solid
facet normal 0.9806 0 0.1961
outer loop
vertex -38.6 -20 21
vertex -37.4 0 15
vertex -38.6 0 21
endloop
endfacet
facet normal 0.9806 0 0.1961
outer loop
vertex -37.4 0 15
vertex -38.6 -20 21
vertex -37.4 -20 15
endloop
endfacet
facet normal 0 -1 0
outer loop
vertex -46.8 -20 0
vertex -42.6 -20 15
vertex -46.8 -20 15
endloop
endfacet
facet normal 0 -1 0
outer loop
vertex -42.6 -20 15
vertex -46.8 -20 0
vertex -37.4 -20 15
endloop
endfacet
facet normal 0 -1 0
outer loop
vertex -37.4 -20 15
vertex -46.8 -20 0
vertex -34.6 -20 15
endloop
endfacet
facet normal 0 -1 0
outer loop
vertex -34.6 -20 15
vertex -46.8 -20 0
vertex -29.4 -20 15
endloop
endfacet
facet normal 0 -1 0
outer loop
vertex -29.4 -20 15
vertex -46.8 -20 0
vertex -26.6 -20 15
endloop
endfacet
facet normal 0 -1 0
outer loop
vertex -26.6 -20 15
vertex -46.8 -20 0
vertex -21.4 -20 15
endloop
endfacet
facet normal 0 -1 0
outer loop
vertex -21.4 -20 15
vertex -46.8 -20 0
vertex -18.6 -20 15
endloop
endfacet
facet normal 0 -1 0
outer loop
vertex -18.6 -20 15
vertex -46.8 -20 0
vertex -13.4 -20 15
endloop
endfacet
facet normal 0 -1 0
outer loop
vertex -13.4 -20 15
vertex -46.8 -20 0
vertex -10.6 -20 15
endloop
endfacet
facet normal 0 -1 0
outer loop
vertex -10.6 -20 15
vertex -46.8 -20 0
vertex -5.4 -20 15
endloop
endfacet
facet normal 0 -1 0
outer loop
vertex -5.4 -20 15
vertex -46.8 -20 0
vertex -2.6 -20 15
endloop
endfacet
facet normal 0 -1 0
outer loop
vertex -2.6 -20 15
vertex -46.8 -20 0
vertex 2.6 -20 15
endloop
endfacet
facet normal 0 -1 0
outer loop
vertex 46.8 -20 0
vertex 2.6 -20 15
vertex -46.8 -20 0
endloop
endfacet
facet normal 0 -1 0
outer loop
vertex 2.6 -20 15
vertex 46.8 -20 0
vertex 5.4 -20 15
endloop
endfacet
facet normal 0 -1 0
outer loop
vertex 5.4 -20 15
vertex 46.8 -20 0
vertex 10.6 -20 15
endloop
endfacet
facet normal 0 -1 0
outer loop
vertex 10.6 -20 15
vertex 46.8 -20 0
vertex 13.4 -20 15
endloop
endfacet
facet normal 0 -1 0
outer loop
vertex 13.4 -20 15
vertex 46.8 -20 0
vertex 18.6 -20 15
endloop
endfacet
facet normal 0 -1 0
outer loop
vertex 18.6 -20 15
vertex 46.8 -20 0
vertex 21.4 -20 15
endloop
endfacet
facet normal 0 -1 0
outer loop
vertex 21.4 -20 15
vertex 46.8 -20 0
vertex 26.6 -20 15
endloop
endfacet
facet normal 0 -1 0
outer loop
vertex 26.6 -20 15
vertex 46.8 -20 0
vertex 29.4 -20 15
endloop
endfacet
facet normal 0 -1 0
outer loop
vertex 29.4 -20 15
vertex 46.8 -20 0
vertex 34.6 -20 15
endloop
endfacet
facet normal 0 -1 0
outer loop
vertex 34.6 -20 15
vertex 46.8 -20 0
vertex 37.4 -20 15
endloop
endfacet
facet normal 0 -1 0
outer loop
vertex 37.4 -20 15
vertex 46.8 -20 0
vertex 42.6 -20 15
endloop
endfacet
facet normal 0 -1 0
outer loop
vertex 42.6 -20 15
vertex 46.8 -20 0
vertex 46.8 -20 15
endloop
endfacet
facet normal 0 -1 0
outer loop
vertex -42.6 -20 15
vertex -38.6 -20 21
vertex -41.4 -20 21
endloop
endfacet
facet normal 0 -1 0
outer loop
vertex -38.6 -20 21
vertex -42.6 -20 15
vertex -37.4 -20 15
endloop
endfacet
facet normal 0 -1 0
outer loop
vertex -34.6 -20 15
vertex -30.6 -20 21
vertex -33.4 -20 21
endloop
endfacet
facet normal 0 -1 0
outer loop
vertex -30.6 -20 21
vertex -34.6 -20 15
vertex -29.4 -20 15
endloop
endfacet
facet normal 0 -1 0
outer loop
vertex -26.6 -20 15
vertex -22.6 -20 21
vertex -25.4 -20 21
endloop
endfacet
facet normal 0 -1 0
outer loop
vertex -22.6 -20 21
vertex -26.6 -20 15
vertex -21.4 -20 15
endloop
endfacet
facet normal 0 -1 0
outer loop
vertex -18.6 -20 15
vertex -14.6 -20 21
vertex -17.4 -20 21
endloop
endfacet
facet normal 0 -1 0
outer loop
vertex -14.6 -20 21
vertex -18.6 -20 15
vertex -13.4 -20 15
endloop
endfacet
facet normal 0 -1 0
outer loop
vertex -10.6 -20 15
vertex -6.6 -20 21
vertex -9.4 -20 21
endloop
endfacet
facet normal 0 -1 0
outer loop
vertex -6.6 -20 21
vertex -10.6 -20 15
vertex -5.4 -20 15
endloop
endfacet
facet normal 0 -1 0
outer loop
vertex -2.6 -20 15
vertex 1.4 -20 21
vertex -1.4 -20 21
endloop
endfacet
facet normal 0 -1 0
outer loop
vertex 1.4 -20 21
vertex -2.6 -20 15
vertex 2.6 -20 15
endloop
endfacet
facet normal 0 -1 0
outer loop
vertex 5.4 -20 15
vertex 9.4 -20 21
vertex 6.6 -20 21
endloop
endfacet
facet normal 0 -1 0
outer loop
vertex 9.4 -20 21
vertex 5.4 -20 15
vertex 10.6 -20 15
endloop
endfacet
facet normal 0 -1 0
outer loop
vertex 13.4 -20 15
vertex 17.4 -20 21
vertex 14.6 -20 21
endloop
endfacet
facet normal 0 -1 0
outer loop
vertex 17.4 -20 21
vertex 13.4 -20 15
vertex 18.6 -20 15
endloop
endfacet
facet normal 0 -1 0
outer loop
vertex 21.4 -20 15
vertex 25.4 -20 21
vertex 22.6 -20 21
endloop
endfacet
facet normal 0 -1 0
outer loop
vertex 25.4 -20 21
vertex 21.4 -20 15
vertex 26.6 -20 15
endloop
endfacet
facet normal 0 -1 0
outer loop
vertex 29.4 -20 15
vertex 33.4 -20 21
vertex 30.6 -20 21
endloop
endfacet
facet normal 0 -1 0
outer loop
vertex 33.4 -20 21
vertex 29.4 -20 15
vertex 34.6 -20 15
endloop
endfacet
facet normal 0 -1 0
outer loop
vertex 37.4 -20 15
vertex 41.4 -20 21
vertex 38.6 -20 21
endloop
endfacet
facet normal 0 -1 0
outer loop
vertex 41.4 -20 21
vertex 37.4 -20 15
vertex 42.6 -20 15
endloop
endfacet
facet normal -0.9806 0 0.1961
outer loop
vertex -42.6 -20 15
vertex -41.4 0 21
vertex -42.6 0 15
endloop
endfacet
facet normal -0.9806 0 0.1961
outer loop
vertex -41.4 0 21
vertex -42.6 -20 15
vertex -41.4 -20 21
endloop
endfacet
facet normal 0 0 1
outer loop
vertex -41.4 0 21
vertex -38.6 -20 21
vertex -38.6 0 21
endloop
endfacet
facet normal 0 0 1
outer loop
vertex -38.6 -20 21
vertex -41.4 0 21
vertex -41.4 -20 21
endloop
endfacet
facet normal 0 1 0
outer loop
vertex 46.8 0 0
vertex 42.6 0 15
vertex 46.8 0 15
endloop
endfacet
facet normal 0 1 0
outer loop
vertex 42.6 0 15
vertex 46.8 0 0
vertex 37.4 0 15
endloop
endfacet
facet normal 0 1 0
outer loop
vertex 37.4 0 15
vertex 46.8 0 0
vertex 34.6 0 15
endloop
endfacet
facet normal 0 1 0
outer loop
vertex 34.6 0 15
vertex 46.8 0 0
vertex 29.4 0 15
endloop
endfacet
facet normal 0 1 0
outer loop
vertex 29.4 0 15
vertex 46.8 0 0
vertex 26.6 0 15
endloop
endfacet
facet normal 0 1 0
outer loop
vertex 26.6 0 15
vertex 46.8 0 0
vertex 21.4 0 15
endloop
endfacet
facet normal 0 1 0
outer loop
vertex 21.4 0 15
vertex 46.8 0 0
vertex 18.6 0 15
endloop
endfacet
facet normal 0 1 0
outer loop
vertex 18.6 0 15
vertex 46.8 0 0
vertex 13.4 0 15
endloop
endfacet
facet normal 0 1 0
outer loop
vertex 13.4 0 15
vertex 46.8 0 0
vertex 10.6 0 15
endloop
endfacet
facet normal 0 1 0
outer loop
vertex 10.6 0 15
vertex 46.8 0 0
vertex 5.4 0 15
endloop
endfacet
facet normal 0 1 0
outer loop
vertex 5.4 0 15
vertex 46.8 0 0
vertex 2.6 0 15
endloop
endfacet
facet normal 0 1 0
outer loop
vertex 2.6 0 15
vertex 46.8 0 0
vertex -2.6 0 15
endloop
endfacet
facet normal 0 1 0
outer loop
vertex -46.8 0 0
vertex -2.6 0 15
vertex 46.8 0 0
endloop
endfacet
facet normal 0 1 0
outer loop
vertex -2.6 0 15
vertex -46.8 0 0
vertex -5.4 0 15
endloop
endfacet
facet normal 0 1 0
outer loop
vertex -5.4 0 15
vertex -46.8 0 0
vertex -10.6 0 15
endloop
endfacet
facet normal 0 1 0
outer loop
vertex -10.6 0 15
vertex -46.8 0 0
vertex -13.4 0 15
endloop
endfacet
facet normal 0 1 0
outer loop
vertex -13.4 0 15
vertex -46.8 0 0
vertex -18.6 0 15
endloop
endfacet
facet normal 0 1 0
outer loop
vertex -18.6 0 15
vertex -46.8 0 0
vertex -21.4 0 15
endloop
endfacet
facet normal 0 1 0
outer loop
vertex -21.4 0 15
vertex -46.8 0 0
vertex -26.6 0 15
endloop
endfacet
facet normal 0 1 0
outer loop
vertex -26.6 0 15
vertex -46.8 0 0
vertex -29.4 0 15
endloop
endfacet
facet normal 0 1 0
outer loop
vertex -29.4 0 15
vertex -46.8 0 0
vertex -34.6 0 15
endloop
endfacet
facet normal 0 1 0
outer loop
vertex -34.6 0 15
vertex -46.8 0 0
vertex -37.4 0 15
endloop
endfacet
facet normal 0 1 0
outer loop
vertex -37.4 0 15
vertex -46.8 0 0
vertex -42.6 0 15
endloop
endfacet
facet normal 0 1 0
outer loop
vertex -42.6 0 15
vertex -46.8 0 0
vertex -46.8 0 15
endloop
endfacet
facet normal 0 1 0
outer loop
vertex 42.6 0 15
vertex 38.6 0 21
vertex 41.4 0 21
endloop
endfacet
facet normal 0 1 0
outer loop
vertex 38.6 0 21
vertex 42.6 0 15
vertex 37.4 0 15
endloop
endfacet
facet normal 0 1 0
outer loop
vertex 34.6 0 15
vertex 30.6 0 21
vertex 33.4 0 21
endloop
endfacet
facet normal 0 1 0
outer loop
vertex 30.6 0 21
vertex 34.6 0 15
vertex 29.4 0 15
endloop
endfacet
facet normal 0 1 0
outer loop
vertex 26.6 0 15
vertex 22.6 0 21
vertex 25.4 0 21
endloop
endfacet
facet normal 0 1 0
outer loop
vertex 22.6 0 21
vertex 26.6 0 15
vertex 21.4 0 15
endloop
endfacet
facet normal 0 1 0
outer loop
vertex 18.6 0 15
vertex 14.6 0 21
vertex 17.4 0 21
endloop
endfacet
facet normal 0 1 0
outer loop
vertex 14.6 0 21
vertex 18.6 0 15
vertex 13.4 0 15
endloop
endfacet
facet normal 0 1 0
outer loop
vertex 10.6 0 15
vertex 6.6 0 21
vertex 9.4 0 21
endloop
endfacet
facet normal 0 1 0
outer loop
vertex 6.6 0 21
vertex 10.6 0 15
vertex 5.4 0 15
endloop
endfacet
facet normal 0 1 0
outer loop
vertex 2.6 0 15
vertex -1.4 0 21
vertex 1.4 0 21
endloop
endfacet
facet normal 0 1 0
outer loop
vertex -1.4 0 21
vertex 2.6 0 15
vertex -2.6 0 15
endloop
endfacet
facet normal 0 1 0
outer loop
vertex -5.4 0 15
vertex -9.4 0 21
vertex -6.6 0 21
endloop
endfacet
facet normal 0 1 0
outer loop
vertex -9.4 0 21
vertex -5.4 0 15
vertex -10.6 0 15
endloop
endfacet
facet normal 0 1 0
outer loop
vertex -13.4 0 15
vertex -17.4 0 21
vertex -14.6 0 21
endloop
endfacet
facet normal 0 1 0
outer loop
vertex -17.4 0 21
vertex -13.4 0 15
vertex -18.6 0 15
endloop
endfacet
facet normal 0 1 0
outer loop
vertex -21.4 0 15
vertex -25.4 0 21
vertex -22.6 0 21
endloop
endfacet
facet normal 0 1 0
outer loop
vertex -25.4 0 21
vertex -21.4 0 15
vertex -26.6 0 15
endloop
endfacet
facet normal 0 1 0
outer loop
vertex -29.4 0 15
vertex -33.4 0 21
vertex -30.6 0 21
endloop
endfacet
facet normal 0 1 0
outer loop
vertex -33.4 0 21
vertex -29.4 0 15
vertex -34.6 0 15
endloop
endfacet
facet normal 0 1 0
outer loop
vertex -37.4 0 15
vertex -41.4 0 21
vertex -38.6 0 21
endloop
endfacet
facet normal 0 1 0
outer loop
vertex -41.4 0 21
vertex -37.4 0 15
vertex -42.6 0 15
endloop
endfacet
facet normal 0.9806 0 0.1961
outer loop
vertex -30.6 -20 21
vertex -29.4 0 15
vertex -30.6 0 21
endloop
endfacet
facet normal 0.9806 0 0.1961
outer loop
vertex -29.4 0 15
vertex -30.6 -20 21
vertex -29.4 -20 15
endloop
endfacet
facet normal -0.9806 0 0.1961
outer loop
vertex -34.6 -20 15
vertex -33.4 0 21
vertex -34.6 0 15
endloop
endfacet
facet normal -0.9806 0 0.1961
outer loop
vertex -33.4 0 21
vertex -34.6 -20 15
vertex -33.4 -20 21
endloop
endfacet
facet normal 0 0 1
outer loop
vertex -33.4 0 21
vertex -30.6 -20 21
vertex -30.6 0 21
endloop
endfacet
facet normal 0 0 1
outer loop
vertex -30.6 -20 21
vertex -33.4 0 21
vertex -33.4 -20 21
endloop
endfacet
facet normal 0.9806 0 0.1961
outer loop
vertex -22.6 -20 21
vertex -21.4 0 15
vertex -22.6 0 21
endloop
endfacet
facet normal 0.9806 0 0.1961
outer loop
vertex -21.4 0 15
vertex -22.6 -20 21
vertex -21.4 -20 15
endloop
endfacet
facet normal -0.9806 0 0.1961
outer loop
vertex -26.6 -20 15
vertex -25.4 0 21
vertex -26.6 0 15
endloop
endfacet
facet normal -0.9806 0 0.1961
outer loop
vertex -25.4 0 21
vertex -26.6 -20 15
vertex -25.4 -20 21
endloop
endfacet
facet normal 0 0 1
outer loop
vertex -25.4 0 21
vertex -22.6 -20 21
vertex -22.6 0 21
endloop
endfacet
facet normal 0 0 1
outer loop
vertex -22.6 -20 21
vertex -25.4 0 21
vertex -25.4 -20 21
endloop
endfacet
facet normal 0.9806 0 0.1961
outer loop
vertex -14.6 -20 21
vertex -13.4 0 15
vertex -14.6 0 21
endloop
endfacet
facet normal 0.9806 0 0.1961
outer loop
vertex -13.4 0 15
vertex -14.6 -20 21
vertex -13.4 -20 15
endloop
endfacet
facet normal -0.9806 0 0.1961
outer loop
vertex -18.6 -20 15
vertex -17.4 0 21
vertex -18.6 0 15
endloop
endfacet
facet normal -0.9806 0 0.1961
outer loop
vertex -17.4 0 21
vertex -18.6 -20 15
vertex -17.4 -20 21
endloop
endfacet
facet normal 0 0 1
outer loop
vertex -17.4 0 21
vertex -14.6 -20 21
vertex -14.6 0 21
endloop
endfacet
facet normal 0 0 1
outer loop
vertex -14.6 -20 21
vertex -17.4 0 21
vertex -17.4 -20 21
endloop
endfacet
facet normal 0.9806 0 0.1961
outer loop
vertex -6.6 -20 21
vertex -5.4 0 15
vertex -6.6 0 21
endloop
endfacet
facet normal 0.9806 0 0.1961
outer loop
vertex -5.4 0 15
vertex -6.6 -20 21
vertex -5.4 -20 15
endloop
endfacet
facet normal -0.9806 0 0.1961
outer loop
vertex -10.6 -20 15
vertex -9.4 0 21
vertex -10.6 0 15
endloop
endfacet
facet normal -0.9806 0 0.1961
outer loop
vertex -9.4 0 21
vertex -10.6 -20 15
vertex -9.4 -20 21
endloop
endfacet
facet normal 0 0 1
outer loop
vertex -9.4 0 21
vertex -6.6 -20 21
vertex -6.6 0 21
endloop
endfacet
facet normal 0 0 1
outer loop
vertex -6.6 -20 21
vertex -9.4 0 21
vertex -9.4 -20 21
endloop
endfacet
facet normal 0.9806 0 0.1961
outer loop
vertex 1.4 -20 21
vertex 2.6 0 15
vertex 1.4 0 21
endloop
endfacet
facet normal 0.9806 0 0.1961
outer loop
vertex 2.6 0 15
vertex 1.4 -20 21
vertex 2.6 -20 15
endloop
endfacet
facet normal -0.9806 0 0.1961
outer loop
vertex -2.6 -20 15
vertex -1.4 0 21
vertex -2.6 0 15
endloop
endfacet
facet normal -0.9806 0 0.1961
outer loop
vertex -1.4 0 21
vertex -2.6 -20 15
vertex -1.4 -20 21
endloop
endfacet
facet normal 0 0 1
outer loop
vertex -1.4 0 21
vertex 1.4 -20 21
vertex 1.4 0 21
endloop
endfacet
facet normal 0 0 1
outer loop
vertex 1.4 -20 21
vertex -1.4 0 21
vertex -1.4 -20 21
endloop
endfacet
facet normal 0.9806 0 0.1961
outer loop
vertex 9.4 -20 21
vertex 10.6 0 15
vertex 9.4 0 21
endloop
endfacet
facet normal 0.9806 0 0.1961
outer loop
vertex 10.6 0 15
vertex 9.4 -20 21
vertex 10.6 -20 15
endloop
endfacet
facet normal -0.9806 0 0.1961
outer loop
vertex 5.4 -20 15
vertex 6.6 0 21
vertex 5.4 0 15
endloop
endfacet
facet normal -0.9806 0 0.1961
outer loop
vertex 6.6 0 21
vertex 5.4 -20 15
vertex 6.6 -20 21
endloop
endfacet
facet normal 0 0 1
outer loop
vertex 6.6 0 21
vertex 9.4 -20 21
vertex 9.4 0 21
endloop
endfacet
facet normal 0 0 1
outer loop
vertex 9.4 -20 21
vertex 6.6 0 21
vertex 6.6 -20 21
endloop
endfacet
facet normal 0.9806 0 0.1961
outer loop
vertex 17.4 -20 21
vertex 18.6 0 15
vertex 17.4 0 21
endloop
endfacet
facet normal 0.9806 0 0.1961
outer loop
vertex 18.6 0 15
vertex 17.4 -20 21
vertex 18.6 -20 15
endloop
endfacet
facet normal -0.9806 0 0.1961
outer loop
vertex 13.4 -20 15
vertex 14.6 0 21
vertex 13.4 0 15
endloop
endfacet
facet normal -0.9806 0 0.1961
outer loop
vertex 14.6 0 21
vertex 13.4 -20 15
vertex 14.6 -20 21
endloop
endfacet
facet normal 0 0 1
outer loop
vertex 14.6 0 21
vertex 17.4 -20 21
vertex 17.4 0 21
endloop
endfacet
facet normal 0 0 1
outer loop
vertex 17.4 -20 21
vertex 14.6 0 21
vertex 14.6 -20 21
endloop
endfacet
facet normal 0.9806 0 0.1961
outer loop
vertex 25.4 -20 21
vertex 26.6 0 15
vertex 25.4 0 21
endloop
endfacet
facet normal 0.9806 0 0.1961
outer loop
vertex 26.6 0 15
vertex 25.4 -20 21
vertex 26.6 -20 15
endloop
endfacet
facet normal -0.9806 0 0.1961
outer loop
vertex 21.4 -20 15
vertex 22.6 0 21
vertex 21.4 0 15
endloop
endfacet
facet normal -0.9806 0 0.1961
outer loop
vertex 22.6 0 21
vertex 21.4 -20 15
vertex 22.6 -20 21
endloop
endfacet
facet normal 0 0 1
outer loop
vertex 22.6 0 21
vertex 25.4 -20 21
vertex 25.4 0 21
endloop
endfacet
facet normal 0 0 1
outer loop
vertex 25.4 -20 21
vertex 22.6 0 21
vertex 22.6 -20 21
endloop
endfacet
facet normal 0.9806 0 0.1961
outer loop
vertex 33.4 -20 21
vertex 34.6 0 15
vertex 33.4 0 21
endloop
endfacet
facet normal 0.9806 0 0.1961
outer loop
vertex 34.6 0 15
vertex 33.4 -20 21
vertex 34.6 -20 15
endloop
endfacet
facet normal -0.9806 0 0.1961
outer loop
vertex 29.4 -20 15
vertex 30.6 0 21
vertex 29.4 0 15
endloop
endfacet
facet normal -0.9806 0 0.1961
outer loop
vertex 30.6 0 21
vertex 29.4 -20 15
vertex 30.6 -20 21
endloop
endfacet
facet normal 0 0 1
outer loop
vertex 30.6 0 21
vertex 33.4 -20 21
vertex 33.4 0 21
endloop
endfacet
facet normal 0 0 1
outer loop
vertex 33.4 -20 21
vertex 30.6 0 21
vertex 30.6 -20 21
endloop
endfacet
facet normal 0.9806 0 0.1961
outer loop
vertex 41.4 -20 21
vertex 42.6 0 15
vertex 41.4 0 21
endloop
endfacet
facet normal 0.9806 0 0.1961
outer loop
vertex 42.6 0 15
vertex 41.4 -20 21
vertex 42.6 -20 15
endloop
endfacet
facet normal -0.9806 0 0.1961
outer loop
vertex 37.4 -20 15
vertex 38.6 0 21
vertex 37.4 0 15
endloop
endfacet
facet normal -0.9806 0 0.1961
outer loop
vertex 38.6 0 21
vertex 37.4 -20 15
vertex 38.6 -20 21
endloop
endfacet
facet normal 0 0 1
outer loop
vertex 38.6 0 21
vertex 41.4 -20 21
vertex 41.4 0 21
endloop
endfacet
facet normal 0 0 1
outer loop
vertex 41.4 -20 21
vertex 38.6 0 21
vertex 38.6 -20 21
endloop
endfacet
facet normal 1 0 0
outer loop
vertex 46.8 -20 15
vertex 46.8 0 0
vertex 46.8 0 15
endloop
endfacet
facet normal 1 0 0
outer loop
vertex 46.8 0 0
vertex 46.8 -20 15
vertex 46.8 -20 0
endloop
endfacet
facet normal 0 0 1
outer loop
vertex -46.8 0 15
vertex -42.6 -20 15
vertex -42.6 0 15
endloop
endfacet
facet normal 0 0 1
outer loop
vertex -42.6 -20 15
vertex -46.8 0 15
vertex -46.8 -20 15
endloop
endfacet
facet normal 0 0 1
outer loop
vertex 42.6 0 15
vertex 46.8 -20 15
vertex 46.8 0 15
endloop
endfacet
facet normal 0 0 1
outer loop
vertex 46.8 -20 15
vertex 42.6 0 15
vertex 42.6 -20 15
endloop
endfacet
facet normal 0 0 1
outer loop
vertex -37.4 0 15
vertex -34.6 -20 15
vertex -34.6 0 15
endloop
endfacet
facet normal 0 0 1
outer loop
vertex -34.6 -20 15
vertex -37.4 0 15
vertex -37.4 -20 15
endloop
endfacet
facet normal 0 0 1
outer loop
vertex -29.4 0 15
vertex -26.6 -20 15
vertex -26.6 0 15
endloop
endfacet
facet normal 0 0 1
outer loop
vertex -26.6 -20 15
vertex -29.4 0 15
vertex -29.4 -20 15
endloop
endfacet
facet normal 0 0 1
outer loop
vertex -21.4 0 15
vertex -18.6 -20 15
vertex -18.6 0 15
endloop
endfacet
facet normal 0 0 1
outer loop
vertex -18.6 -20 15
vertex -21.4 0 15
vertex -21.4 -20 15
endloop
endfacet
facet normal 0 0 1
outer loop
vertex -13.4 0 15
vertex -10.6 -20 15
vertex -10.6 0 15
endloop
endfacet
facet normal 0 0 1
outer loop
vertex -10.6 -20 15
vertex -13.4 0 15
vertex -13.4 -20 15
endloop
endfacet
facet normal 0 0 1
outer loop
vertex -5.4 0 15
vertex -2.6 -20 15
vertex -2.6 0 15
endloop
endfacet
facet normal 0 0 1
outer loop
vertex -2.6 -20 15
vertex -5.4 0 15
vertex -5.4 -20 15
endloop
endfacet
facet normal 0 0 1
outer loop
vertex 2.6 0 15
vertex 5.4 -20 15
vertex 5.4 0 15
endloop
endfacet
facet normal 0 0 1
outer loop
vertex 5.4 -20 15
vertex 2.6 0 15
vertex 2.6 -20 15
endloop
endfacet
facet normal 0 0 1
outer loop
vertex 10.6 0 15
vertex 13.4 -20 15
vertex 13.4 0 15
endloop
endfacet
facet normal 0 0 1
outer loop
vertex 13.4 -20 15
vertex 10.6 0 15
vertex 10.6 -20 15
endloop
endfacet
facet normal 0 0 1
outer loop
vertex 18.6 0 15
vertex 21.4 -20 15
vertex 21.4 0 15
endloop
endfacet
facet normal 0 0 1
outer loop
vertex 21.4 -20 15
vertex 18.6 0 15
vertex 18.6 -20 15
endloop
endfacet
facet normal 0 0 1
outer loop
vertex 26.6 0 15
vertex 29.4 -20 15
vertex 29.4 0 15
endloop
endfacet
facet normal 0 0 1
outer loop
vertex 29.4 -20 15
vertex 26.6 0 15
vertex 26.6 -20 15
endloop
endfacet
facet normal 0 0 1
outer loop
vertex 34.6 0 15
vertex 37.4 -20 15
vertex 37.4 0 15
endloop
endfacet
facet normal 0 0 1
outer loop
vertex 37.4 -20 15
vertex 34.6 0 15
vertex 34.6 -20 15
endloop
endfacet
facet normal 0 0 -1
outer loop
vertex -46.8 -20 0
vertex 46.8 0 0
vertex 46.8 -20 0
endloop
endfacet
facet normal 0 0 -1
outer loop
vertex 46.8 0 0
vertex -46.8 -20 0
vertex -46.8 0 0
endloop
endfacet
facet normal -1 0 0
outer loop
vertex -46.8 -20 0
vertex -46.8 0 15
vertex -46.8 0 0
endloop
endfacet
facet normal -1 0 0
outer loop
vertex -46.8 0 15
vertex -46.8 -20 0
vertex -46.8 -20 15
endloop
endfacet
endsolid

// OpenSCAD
$fn = 32;

// ----------------------------------------------------------------------
// Toothed rack, 11 teeth
// 8 mm pitch, 6 mm teeth
// ----------------------------------------------------------------------

// --- parameters (mm) ---
bar_w = 20;     // bar width (Y)
bar_h = 15;     // bar height (Z)
teeth = 11;     // number of teeth
pitch = 8;      // tooth pitch
tooth_h = 6;    // tooth height above the bar
root_w = 5.6;   // tooth width at the root
crest_w = 2.8;  // tooth width at the crest

// --- derived feature positions (mm) ---
span = (teeth - 1) * pitch;  // = 80   distance between the outer teeth
bar_l = span + root_w + 8;   // = 93.6   bar length: teeth plus 4 mm at each end
tooth_x = -span / 2;         // = -40   X of the first tooth
height = bar_h + tooth_h;    // = 21   overall height
feature_centers = [
  [tooth_x + 0 * pitch, -bar_w / 2],
  [tooth_x + 1 * pitch, -bar_w / 2],
  [tooth_x + 2 * pitch, -bar_w / 2],
  [tooth_x + 3 * pitch, -bar_w / 2],
  [tooth_x + 4 * pitch, -bar_w / 2],
  [tooth_x + 5 * pitch, -bar_w / 2],
  [tooth_x + 6 * pitch, -bar_w / 2],
  [tooth_x + 7 * pitch, -bar_w / 2],
  [tooth_x + 8 * pitch, -bar_w / 2],
  [tooth_x + 9 * pitch, -bar_w / 2],
  [tooth_x + 10 * pitch, -bar_w / 2]
];   // tooth centre line, drives the tooth loop

// bar with a rack of teeth, one extruded trapezoium per centre
module rack_tooth() {
  linear_extrude(height = bar_w)
    polygon(points = [
      [0, 0],
      [root_w, 0],
      [root_w / 2 + crest_w / 2, tooth_h + 1],
      [root_w / 2 - crest_w / 2, tooth_h + 1]
    ]);
}

union() {
  translate([-bar_l / 2, -bar_w, 0]) cube([bar_l, bar_w, bar_h]);
  for (centre = feature_centers)
    translate([centre[0] - root_w / 2, 0, bar_h - 1]) rotate([90, 0, 0]) rack_tooth();
}
